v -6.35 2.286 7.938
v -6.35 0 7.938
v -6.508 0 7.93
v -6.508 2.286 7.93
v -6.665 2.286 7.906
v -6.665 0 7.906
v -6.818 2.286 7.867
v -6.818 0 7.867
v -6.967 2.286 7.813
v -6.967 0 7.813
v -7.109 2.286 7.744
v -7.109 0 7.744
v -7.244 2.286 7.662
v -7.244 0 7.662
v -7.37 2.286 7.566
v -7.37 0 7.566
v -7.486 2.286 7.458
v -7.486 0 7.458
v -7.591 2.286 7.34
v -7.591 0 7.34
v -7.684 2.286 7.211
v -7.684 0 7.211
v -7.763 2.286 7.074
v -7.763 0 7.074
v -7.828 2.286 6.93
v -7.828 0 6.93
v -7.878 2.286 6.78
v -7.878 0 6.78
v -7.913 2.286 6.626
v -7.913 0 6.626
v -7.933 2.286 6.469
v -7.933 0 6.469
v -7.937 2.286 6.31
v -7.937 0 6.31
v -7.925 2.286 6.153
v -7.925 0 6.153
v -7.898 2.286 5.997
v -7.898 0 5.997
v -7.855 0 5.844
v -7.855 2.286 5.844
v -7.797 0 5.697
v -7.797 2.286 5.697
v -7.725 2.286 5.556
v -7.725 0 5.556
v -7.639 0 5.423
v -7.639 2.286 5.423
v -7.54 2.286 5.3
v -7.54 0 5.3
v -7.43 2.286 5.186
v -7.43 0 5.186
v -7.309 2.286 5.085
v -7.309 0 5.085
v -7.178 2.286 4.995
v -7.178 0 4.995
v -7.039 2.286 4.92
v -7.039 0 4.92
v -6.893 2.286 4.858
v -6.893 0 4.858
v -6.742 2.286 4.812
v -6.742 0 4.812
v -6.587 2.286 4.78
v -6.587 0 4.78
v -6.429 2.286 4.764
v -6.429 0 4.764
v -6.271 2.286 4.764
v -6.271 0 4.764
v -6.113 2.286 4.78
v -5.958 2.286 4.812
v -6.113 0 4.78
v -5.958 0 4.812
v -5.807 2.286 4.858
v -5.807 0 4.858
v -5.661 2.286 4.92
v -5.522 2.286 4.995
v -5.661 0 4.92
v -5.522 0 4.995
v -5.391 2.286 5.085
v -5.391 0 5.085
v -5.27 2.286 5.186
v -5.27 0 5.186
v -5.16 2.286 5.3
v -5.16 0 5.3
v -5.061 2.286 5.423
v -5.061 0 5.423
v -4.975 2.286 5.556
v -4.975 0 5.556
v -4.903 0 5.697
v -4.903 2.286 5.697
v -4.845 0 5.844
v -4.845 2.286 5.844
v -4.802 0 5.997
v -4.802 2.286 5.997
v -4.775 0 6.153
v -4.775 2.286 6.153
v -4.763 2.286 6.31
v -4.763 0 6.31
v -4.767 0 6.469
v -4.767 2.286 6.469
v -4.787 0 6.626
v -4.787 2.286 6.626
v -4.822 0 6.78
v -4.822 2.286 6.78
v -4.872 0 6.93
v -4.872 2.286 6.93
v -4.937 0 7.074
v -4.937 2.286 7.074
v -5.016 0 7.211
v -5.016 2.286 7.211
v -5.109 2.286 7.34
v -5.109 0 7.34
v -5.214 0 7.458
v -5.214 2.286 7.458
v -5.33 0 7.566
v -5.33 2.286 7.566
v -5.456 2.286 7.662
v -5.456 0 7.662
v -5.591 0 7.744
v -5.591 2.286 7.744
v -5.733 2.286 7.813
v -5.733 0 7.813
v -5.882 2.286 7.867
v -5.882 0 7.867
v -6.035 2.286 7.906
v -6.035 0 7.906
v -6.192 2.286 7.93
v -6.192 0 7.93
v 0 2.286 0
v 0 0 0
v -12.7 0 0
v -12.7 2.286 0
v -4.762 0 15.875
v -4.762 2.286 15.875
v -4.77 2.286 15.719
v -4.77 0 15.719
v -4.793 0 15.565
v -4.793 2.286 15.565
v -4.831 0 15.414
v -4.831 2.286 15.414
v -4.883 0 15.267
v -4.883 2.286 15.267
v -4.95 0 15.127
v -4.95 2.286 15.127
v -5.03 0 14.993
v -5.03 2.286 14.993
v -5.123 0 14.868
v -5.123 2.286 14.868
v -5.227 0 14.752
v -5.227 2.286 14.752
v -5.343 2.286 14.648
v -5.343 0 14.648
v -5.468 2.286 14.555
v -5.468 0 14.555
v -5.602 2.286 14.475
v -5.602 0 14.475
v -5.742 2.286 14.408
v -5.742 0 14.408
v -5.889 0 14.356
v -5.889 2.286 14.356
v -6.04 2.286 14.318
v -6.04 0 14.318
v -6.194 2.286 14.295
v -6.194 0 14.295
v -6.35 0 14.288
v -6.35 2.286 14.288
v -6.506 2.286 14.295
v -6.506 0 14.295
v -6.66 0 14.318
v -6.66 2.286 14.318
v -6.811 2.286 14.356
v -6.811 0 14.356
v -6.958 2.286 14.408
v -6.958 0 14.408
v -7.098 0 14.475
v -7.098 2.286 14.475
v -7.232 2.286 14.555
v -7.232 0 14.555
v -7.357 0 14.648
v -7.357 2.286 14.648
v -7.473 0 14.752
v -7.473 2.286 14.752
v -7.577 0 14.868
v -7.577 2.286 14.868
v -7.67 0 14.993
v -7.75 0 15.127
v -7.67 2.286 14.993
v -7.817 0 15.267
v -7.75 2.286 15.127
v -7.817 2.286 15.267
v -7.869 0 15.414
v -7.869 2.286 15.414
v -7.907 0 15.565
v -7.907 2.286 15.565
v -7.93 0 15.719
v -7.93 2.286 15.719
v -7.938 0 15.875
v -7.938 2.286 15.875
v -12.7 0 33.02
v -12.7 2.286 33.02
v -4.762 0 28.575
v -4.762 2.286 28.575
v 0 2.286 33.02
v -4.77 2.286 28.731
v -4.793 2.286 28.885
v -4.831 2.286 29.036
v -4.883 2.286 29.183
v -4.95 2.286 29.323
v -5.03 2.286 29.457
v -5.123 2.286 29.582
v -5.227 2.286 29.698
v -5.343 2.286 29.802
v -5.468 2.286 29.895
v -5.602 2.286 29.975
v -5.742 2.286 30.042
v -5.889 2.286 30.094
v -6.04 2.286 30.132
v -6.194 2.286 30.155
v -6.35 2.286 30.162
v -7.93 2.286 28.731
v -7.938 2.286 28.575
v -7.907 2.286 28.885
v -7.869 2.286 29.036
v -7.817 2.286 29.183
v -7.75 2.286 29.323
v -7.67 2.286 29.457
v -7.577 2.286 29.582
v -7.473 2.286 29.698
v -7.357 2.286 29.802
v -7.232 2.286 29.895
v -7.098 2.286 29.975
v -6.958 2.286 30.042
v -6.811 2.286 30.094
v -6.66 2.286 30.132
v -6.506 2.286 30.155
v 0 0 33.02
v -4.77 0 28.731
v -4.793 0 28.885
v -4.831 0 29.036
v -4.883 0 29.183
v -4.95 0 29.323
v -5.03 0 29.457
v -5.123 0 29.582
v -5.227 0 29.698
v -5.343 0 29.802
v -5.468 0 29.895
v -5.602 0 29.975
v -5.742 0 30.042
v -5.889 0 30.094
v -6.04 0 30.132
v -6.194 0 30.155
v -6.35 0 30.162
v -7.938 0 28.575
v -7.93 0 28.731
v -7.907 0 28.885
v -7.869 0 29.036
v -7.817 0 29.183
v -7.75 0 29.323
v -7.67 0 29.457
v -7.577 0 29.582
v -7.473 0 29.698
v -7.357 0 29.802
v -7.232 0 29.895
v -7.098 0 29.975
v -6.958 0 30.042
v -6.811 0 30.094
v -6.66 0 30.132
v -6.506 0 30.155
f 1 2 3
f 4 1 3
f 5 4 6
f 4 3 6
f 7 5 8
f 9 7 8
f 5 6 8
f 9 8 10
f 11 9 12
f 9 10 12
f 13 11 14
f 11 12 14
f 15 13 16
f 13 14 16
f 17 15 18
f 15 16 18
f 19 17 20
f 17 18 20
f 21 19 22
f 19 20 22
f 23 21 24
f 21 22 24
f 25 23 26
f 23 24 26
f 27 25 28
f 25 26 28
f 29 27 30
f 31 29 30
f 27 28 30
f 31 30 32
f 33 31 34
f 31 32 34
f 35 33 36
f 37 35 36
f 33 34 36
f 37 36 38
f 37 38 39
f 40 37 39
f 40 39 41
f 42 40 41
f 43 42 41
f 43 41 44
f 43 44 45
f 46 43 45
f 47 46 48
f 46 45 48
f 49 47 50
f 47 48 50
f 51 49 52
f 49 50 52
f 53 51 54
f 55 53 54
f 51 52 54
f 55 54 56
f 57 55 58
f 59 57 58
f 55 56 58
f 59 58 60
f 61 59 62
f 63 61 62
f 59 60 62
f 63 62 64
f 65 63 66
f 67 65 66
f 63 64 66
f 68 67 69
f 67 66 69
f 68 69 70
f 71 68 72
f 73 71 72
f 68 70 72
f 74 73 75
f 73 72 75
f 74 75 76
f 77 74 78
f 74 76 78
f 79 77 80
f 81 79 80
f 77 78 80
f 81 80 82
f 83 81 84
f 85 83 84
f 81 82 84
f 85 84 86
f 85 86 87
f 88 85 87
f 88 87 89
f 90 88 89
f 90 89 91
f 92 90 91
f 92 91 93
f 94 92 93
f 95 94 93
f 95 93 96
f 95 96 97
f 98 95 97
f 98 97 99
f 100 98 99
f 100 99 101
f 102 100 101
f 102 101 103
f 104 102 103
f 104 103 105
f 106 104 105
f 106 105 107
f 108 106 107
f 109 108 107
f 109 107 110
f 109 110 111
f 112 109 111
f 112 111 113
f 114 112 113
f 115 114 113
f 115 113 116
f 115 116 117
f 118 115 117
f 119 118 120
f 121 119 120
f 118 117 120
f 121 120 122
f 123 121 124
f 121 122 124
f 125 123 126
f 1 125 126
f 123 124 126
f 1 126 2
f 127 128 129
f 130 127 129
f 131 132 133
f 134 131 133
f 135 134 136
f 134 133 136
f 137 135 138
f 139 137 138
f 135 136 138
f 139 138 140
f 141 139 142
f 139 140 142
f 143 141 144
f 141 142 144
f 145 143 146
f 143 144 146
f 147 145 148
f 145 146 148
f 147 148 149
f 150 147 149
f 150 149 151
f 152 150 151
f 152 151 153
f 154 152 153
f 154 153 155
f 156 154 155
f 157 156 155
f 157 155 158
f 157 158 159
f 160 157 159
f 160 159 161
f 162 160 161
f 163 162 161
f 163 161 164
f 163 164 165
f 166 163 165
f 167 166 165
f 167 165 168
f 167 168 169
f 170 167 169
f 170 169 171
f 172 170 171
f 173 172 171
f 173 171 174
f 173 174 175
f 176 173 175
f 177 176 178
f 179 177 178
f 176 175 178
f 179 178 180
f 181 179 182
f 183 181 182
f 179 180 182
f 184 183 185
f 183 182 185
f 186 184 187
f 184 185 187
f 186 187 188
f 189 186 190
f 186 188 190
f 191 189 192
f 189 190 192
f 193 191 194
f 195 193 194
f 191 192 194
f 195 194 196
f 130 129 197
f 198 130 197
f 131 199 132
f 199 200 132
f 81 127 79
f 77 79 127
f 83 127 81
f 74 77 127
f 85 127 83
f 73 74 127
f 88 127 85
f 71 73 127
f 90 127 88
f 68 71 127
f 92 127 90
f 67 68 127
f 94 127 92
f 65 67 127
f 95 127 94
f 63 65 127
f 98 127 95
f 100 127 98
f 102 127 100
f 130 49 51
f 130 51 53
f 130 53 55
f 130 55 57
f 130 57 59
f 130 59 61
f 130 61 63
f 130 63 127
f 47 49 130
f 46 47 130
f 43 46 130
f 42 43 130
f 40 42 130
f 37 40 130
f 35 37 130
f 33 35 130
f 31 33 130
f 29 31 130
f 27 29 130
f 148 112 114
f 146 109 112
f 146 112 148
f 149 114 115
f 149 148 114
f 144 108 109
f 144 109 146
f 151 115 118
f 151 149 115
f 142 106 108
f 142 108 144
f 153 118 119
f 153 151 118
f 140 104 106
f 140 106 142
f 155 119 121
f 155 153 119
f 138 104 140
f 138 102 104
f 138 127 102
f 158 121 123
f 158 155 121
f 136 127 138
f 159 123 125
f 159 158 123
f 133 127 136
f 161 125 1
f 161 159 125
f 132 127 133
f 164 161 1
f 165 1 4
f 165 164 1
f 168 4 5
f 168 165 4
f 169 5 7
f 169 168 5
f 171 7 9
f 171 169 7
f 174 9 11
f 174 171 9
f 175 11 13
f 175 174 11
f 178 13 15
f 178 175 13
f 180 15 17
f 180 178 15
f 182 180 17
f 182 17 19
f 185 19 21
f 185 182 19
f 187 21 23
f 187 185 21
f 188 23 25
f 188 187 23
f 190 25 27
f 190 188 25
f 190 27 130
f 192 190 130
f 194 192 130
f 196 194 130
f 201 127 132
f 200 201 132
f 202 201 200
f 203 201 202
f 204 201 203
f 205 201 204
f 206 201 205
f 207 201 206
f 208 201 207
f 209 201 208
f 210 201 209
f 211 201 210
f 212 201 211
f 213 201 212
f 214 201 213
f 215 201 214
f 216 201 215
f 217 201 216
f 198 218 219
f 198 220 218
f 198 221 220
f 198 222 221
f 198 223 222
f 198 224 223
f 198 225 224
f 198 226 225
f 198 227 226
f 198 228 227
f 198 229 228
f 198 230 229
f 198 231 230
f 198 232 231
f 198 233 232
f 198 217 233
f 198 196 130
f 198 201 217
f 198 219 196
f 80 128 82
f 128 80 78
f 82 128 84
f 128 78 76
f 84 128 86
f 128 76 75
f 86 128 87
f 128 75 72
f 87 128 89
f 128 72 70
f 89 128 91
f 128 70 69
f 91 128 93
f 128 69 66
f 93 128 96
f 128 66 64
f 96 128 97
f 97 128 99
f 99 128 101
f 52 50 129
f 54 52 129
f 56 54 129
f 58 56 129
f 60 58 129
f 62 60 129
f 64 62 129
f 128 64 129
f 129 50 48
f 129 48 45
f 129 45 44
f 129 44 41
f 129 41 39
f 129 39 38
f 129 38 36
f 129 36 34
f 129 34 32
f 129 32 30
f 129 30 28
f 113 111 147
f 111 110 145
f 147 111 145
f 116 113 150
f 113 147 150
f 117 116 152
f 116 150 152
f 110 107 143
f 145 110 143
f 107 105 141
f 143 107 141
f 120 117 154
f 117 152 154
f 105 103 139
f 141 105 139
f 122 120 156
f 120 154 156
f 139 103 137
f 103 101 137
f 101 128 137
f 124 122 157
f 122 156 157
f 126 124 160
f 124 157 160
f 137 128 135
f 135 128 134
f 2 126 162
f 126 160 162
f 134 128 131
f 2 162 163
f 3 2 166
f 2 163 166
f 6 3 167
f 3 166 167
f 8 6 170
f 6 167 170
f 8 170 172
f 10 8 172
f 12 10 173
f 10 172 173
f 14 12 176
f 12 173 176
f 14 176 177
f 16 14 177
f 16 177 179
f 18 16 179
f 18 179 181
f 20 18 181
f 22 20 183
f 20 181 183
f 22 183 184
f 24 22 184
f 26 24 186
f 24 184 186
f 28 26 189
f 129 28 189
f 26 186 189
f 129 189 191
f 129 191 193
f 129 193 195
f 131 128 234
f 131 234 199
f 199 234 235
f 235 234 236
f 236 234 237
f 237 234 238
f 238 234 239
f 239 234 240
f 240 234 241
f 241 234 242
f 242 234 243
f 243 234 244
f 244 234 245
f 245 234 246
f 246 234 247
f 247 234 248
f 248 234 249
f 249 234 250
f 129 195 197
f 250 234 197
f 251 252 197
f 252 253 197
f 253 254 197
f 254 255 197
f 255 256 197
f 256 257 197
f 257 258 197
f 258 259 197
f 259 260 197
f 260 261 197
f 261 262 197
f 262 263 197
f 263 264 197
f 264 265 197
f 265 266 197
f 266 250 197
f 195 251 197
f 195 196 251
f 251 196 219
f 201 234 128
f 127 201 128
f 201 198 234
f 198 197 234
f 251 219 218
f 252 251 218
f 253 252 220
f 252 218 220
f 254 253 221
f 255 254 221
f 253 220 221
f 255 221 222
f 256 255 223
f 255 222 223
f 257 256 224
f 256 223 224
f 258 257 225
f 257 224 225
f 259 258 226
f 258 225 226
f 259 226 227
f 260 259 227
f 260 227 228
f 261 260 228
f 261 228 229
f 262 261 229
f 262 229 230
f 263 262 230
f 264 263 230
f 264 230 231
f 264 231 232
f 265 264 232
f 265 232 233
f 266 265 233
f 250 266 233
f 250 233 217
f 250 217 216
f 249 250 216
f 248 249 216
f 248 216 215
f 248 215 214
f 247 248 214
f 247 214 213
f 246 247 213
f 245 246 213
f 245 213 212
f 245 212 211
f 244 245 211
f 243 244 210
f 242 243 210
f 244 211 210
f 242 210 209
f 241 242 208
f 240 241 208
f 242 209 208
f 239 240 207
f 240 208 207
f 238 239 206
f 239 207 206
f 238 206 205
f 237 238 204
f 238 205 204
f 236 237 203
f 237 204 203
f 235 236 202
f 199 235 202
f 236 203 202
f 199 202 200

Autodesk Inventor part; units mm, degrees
ref_plane "YZ Plane" through (0, 0, 0) normal (1, 0, 0) x (0, 1, 0)
ref_plane "XZ Plane" through (0, 0, 0) normal (0, 1, 0) x (-1, 0, 0)
ref_plane "XY Plane" through (0, 0, 0) normal (0, 0, 1) x (1, 0, 0)
sketch "Sketch1" plane through (0, 0, 0) normal (0, 1, 0) x (-1, 0, 0)
  line L0 (0, 0) -> (12.7, 0)
  line L1 (12.7, 0) -> (12.7, 33.02)
  line L2 (12.7, 33.02) -> (0, 33.02)
  line L3 (0, 33.02) -> (0, 0)
  dimension "d0" = 12.7
  dimension "d1" = 33.02
extrude "Extrusion1" add sketch "Sketch1" along normal blind 2.286
sketch "Sketch2" plane through (0, 2.286, 0) normal (0, 1, 0) x (1, 0, 0)
  point P0 (0, 0)
sketch "Sketch3" plane through (0, 2.286, 0) normal (0, 1, 0) x (1, 0, 0)
  circle A0 centre (-6.35, -6.35) radius 1.778
  point P0 (0, 0)
  dimension "d4" = 3.556
hole "Hole1" at (-6.35, 2.286, 6.35) direction (0, -1, 0) diameter 3.175 end through all
sketch "Sketch4" plane through (0, 2.286, 0) normal (0, 1, 0) x (1, 0, 0)
  point P0 (0, 0)
sketch "Sketch6" plane through (0, 2.286, 0) normal (0, 1, 0) x (1, 0, 0)
  line L0 (-6.35, -15.875) -> (-6.35, -28.575) construction
  line L1 (-7.9375, -15.875) -> (-7.9375, -28.575)
  line L2 (-4.7625, -28.575) -> (-4.7625, -15.875)
  arc A0 (-4.7625, -15.875) -> (-7.9375, -15.875) centre (-6.35, -15.875) ccw
  arc A1 (-7.9375, -28.575) -> (-4.7625, -28.575) centre (-6.35, -28.575) ccw
  point P0 (0, 0)
  point P1 (-6.35, -12.7)
  point P2 (-6.35, -22.225)
  dimension "d15" = 3.175
extrude "Extrusion3" cut sketch "Sketch6" against normal blind 2.286
sketch "Sketch7" plane through (0, 2.286, 0) normal (0, 1, 0) x (1, 0, 0)
  circle A0 centre (-6.35, -6.35) radius 1.5875 projected
  circle A1 centre (-6.35, -6.35) radius 3.175
  point P0 (0, 0)
  dimension "d18" = 6.35
properties part number "WireHangerBase"
